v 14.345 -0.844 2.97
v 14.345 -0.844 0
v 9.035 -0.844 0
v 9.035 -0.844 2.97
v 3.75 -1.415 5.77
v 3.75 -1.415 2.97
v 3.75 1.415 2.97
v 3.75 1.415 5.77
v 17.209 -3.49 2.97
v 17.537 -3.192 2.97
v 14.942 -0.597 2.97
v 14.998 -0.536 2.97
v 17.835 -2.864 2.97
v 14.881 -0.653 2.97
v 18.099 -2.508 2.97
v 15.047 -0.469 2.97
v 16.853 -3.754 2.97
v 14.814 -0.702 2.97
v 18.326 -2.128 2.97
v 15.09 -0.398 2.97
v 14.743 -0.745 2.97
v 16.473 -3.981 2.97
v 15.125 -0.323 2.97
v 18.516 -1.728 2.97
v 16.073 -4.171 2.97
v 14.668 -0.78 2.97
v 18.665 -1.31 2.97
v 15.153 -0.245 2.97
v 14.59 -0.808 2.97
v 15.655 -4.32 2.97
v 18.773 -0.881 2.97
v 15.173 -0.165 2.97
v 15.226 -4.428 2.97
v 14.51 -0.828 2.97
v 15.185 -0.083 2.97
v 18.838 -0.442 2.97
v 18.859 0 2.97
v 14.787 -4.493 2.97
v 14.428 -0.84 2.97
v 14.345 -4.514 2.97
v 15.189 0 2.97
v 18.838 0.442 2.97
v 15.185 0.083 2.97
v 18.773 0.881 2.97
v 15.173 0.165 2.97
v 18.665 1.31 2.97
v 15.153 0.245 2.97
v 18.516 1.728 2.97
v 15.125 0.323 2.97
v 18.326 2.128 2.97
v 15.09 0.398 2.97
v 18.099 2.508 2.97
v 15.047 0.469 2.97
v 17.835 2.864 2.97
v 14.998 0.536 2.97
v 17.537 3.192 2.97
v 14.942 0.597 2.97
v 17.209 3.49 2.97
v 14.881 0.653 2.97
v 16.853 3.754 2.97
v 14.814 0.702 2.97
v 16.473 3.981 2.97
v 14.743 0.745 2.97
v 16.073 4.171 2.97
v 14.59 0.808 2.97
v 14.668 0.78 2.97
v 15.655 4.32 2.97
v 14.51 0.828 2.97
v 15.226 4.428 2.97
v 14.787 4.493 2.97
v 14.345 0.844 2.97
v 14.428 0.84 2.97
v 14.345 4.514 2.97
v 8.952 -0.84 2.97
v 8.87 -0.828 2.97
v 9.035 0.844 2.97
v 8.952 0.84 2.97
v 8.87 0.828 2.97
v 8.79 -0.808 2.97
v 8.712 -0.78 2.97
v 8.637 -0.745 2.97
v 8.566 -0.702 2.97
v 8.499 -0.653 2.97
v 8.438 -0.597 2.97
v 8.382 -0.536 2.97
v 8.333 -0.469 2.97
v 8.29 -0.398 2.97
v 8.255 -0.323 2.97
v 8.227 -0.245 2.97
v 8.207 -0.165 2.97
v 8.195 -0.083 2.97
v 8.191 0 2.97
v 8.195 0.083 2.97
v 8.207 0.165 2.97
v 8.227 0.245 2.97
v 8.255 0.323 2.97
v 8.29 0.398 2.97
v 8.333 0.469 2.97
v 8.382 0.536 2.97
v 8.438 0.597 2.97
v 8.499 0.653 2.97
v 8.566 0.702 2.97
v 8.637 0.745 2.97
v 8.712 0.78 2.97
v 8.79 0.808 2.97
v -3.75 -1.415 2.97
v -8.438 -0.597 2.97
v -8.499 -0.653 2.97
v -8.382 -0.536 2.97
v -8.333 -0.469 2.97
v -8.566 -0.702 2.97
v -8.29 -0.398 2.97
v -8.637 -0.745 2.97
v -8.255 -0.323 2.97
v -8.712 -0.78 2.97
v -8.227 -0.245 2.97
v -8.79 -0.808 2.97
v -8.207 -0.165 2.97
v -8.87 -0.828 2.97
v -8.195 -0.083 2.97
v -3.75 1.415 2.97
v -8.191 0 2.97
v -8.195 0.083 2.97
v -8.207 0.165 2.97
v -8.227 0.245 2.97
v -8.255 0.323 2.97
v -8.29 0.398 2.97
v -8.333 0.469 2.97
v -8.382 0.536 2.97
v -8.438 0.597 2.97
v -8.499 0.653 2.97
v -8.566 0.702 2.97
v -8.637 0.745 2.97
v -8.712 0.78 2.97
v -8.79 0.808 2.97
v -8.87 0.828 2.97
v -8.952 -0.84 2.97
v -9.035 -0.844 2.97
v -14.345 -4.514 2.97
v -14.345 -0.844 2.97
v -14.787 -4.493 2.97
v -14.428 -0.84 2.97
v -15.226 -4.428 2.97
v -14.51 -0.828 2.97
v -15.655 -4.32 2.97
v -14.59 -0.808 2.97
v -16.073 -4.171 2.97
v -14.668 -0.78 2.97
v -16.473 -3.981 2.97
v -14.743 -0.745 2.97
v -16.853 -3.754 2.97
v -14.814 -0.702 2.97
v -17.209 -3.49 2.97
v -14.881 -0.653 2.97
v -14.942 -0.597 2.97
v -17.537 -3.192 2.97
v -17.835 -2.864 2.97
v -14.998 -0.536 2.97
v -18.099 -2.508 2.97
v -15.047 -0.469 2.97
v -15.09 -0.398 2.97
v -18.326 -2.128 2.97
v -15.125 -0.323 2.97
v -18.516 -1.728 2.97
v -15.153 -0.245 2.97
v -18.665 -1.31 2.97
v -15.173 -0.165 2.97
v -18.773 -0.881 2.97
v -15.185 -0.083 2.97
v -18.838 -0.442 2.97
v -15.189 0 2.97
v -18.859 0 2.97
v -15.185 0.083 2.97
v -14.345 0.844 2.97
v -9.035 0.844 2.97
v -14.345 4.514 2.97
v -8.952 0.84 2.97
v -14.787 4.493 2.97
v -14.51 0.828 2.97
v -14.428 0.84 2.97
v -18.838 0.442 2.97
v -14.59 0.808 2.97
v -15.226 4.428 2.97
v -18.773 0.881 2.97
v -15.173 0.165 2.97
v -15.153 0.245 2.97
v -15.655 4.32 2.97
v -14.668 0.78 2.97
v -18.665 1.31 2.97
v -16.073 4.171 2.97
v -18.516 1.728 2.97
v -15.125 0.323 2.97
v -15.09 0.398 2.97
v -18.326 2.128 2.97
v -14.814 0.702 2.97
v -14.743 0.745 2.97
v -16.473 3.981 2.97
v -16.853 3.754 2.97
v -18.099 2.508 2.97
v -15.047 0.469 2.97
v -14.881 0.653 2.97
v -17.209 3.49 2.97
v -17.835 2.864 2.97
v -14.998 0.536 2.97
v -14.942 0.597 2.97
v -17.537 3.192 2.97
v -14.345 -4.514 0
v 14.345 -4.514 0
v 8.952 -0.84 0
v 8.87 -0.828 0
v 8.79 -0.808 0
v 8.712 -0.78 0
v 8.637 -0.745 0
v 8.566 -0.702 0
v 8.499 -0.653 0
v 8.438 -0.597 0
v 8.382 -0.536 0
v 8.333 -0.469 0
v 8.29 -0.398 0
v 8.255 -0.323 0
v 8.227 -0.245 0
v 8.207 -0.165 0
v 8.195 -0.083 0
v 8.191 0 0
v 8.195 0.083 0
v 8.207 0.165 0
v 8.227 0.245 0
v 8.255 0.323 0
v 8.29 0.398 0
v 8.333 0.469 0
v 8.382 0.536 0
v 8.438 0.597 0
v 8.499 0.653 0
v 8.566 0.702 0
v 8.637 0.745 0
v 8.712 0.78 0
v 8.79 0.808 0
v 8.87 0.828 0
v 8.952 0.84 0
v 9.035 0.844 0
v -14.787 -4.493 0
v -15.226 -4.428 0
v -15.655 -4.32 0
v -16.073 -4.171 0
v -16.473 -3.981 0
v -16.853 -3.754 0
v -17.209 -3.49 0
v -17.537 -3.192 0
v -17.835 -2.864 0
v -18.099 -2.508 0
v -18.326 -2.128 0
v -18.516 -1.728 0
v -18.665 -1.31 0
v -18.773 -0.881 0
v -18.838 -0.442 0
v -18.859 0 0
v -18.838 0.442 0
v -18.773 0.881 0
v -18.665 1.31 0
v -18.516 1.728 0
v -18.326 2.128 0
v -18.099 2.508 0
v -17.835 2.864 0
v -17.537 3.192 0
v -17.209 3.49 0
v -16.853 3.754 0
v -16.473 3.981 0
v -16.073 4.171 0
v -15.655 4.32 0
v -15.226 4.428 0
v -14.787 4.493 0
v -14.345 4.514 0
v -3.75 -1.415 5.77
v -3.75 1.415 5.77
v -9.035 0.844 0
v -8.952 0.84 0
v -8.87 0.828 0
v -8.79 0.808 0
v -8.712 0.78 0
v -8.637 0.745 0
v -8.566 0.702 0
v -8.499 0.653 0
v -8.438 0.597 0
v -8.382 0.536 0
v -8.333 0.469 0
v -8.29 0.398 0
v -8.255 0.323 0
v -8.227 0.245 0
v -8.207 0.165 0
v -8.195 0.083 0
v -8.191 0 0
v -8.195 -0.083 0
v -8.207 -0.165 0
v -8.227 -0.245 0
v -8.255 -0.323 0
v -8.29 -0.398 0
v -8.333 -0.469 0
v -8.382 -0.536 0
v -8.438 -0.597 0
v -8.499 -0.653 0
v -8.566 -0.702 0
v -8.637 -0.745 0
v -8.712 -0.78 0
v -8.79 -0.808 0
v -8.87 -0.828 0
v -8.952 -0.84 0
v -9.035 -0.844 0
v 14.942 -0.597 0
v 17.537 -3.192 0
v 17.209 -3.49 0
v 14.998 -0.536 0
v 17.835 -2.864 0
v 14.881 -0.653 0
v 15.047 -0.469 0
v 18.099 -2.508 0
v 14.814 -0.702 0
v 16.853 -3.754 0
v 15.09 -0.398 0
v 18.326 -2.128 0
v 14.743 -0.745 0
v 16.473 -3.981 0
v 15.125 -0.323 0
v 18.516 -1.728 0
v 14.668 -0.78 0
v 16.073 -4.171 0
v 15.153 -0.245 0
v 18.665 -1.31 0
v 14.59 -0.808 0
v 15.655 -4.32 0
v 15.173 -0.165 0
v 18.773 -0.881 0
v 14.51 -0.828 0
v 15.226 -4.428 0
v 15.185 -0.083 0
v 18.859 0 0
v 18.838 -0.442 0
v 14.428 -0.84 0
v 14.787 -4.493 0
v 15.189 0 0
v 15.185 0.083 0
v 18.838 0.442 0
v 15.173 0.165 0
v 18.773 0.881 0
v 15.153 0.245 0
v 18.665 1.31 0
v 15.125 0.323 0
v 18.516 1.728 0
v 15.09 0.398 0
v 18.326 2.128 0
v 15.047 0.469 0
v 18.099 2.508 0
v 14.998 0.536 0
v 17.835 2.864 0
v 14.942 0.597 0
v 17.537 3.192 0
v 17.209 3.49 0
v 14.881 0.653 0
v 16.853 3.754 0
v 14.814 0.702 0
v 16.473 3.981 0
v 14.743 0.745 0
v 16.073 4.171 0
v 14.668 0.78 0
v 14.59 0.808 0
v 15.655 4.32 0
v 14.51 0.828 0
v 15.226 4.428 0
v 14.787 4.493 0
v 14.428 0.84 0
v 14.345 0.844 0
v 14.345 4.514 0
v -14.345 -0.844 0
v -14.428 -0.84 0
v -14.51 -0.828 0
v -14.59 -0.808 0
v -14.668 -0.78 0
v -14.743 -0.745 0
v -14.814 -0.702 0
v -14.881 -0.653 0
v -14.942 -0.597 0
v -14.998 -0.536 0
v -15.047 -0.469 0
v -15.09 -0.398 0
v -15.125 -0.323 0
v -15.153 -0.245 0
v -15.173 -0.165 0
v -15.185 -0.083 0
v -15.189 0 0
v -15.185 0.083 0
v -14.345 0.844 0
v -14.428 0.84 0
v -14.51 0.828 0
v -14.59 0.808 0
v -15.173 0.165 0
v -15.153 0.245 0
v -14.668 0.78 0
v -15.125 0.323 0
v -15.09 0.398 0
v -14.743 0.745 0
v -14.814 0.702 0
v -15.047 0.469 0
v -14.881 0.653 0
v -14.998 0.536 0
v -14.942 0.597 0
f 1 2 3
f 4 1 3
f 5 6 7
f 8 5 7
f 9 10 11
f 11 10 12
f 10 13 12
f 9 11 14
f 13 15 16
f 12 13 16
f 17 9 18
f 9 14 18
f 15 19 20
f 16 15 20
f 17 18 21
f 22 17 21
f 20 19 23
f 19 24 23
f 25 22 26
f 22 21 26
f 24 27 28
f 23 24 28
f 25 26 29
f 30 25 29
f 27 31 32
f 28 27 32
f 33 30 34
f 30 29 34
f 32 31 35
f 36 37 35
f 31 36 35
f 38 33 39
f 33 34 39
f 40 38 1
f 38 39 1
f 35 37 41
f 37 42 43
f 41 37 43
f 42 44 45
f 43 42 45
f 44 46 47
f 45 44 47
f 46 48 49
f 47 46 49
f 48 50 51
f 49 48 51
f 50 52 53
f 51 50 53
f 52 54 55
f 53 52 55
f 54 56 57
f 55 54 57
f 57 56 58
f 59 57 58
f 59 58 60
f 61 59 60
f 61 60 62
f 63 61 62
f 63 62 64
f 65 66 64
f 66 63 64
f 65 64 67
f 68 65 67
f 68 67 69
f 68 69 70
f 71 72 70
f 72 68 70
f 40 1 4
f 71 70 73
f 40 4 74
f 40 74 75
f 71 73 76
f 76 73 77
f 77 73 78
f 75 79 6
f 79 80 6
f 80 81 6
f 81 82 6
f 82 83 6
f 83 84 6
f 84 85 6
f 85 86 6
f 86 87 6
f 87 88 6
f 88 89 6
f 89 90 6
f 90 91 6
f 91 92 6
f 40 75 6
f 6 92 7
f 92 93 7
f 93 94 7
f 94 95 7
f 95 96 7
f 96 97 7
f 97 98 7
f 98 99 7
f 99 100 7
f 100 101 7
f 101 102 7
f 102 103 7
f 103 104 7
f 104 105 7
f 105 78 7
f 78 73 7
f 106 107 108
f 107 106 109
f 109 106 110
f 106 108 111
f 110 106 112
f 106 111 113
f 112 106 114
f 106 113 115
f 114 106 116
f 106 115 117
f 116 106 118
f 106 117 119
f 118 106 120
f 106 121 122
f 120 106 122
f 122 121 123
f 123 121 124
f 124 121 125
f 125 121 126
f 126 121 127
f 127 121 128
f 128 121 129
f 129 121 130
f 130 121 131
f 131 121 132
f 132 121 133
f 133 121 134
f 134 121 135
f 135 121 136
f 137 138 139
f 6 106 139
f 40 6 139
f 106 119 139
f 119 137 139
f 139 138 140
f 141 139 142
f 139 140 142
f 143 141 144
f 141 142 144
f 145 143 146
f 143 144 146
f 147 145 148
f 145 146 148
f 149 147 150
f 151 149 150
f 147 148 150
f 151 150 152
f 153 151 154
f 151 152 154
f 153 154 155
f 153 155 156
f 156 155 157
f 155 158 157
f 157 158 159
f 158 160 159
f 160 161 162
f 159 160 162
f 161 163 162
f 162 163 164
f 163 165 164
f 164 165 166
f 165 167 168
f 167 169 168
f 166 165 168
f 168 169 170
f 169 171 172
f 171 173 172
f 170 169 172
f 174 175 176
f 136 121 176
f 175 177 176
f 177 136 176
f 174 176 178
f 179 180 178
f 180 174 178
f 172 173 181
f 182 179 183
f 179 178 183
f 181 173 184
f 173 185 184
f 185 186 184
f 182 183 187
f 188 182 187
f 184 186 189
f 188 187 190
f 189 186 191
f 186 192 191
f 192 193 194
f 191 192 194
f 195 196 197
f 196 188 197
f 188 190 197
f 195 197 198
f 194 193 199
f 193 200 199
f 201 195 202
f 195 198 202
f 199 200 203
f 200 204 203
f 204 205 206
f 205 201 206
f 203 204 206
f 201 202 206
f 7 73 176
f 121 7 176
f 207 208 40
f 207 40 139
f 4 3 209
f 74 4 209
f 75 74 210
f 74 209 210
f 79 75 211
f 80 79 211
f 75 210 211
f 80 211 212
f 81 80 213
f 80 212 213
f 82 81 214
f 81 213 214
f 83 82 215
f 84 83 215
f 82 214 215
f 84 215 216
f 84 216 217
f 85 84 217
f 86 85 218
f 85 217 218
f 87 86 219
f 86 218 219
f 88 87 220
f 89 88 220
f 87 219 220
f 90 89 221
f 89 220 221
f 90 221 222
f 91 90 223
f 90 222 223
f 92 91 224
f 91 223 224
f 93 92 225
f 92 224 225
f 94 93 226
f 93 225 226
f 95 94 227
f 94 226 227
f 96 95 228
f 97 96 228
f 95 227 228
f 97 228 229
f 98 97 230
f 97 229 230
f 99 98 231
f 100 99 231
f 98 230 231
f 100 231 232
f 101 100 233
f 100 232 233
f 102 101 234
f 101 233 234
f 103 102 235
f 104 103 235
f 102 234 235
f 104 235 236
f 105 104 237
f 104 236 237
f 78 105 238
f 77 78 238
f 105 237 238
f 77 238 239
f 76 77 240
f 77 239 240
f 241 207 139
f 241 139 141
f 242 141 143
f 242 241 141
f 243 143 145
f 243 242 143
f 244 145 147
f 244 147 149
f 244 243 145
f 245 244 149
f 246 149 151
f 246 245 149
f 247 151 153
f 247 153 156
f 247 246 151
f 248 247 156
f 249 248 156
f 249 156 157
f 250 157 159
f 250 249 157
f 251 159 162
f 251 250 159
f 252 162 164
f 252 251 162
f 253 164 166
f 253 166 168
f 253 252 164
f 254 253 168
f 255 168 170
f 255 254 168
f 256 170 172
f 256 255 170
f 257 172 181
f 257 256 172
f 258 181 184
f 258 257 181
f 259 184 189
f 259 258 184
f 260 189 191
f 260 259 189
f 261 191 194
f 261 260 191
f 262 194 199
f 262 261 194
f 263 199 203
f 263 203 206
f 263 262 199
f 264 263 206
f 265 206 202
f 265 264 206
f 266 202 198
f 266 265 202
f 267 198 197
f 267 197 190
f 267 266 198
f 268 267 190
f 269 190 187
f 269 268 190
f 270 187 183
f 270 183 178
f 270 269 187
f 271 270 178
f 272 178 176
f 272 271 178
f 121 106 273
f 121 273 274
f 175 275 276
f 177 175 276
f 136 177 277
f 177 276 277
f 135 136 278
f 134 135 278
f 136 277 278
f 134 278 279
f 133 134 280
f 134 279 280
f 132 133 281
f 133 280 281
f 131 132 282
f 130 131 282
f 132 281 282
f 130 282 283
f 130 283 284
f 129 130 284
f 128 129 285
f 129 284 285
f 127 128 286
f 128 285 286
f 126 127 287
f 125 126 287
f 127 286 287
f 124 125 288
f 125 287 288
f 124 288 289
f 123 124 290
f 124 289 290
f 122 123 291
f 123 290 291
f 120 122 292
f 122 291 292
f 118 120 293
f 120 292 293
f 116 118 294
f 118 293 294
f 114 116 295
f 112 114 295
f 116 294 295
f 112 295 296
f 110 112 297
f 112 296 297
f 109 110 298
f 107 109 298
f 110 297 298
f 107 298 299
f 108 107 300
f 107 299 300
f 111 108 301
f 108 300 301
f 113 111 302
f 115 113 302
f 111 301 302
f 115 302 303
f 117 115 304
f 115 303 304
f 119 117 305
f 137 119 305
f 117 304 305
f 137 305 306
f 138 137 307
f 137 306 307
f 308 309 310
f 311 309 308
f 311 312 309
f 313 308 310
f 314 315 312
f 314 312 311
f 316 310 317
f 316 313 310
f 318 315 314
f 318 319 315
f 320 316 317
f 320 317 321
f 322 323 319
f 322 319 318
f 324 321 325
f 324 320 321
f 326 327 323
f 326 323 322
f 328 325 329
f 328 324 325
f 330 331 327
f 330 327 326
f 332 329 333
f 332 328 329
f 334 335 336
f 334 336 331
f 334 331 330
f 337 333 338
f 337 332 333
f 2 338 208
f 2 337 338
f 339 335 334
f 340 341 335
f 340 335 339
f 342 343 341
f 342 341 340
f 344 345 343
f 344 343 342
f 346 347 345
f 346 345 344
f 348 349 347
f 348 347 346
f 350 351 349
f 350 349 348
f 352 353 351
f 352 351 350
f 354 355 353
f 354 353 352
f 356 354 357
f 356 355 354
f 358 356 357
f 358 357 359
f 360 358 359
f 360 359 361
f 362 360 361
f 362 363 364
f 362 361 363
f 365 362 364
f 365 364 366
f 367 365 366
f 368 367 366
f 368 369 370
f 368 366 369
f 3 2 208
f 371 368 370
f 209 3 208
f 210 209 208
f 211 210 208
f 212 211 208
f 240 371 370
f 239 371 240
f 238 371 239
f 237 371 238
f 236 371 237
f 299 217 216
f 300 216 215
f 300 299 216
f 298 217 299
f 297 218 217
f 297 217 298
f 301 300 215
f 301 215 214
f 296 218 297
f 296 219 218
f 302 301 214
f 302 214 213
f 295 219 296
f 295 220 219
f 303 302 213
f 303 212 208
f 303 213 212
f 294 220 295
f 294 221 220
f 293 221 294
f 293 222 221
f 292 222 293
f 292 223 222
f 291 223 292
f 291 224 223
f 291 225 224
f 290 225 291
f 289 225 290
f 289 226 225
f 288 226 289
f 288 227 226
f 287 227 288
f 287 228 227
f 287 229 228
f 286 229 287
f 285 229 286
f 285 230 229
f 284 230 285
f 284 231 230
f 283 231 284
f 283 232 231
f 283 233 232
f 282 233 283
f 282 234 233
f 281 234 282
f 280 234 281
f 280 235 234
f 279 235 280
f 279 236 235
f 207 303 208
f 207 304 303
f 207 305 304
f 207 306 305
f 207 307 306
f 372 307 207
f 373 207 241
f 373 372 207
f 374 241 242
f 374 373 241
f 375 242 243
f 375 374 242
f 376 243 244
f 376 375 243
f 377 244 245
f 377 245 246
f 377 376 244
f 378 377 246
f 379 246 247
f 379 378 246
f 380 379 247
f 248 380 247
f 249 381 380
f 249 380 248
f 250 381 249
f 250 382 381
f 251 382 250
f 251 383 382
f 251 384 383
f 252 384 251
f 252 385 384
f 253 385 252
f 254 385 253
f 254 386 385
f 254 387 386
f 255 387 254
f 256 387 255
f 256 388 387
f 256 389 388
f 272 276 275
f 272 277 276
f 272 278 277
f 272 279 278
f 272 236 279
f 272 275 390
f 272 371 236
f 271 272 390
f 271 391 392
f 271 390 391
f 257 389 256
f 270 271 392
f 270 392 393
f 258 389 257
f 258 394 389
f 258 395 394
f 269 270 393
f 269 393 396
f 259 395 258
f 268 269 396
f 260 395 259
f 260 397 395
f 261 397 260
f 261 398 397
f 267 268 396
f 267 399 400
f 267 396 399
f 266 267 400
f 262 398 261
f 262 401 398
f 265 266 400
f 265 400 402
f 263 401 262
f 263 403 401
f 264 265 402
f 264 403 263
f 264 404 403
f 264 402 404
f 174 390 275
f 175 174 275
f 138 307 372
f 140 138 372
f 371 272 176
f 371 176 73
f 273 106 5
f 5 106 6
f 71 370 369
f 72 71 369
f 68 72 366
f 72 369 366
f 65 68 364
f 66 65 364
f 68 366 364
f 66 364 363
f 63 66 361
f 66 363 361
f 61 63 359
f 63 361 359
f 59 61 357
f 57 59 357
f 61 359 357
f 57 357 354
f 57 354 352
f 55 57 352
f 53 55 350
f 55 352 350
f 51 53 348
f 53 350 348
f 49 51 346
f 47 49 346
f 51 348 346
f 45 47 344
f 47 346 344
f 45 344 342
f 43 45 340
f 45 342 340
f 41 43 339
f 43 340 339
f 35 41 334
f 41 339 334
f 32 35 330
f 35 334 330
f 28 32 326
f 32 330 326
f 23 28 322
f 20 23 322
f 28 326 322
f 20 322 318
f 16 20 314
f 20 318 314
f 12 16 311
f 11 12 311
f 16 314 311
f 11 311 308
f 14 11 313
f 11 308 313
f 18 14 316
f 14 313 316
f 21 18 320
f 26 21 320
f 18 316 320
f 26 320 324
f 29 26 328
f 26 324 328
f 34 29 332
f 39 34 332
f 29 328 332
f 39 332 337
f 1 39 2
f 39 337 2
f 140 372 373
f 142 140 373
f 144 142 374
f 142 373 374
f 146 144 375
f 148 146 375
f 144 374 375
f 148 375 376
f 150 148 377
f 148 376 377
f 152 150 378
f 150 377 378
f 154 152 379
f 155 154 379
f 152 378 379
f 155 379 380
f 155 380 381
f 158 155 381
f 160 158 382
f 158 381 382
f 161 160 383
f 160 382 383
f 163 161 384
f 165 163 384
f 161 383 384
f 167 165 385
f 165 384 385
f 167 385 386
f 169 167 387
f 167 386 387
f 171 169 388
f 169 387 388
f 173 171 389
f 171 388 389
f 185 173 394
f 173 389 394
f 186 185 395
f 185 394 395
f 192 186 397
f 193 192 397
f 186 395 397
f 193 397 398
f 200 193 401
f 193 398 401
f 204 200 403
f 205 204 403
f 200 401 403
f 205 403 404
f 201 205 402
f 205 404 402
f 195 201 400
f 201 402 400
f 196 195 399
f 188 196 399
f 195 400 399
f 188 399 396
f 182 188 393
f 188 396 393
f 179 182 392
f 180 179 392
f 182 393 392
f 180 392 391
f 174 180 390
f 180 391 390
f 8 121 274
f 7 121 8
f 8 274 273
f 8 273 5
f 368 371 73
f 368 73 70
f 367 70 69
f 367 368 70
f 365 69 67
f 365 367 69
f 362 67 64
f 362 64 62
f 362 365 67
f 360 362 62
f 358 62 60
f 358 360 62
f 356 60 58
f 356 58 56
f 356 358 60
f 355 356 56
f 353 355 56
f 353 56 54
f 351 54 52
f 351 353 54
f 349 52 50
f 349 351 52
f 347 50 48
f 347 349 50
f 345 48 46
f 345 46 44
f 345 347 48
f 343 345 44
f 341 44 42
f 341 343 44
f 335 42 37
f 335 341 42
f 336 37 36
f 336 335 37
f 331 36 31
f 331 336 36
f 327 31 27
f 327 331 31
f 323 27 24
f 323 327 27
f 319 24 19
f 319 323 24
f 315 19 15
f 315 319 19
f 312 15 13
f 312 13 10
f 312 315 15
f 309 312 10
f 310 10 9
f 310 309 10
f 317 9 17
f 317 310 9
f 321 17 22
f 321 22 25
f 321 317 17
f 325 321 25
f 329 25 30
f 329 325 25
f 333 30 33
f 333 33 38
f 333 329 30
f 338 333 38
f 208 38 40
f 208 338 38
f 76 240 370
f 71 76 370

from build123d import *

# Parameters (mm, degrees)
BOSS_EXTRUDE2_DEPTH = 2.97
SKETCH5_W           = 7.5
SKETCH5_H           = 2.83
BOSS_EXTRUDE3_DEPTH = 2.8


with BuildPart() as part:
    # Sketch3 → Boss-Extrude2 (new body)
    with BuildSketch(Plane.XY):
        with BuildLine():
            Line((-14.345, 4.51436853), (14.345, 4.51436853))
            ThreePointArc((14.345, 4.51436853), (18.85936853, 0), (14.345, -4.51436853))
            Line((14.345, -4.51436853), (-14.345, -4.51436853))
            ThreePointArc((-14.345, -4.51436853), (-18.85936853, 0), (-14.345, 4.51436853))
        make_face()
        with BuildLine():
            Line((-14.345, 0.84436853), (-9.035, 0.84436853))
            ThreePointArc((-9.035, 0.84436853), (-8.19063147, 0), (-9.035, -0.84436853))
            Line((-9.035, -0.84436853), (-14.345, -0.84436853))
            ThreePointArc((-14.345, -0.84436853), (-15.18936853, 0), (-14.345, 0.84436853))
        make_face(mode=Mode.SUBTRACT)
        with BuildLine():
            Line((14.345, -0.84436853), (9.035, -0.84436853))
            ThreePointArc((9.035, -0.84436853), (8.19063147, 0), (9.035, 0.84436853))
            Line((9.035, 0.84436853), (14.345, 0.84436853))
            ThreePointArc((14.345, 0.84436853), (15.18936853, 0), (14.345, -0.84436853))
        make_face(mode=Mode.SUBTRACT)
    extrude(amount=BOSS_EXTRUDE2_DEPTH)

    # Sketch5 → Boss-Extrude3 (add)
    with BuildSketch(Plane.XY.offset(2.97)):
        Rectangle(SKETCH5_W, SKETCH5_H)
    extrude(amount=BOSS_EXTRUDE3_DEPTH)


solid = part.part
